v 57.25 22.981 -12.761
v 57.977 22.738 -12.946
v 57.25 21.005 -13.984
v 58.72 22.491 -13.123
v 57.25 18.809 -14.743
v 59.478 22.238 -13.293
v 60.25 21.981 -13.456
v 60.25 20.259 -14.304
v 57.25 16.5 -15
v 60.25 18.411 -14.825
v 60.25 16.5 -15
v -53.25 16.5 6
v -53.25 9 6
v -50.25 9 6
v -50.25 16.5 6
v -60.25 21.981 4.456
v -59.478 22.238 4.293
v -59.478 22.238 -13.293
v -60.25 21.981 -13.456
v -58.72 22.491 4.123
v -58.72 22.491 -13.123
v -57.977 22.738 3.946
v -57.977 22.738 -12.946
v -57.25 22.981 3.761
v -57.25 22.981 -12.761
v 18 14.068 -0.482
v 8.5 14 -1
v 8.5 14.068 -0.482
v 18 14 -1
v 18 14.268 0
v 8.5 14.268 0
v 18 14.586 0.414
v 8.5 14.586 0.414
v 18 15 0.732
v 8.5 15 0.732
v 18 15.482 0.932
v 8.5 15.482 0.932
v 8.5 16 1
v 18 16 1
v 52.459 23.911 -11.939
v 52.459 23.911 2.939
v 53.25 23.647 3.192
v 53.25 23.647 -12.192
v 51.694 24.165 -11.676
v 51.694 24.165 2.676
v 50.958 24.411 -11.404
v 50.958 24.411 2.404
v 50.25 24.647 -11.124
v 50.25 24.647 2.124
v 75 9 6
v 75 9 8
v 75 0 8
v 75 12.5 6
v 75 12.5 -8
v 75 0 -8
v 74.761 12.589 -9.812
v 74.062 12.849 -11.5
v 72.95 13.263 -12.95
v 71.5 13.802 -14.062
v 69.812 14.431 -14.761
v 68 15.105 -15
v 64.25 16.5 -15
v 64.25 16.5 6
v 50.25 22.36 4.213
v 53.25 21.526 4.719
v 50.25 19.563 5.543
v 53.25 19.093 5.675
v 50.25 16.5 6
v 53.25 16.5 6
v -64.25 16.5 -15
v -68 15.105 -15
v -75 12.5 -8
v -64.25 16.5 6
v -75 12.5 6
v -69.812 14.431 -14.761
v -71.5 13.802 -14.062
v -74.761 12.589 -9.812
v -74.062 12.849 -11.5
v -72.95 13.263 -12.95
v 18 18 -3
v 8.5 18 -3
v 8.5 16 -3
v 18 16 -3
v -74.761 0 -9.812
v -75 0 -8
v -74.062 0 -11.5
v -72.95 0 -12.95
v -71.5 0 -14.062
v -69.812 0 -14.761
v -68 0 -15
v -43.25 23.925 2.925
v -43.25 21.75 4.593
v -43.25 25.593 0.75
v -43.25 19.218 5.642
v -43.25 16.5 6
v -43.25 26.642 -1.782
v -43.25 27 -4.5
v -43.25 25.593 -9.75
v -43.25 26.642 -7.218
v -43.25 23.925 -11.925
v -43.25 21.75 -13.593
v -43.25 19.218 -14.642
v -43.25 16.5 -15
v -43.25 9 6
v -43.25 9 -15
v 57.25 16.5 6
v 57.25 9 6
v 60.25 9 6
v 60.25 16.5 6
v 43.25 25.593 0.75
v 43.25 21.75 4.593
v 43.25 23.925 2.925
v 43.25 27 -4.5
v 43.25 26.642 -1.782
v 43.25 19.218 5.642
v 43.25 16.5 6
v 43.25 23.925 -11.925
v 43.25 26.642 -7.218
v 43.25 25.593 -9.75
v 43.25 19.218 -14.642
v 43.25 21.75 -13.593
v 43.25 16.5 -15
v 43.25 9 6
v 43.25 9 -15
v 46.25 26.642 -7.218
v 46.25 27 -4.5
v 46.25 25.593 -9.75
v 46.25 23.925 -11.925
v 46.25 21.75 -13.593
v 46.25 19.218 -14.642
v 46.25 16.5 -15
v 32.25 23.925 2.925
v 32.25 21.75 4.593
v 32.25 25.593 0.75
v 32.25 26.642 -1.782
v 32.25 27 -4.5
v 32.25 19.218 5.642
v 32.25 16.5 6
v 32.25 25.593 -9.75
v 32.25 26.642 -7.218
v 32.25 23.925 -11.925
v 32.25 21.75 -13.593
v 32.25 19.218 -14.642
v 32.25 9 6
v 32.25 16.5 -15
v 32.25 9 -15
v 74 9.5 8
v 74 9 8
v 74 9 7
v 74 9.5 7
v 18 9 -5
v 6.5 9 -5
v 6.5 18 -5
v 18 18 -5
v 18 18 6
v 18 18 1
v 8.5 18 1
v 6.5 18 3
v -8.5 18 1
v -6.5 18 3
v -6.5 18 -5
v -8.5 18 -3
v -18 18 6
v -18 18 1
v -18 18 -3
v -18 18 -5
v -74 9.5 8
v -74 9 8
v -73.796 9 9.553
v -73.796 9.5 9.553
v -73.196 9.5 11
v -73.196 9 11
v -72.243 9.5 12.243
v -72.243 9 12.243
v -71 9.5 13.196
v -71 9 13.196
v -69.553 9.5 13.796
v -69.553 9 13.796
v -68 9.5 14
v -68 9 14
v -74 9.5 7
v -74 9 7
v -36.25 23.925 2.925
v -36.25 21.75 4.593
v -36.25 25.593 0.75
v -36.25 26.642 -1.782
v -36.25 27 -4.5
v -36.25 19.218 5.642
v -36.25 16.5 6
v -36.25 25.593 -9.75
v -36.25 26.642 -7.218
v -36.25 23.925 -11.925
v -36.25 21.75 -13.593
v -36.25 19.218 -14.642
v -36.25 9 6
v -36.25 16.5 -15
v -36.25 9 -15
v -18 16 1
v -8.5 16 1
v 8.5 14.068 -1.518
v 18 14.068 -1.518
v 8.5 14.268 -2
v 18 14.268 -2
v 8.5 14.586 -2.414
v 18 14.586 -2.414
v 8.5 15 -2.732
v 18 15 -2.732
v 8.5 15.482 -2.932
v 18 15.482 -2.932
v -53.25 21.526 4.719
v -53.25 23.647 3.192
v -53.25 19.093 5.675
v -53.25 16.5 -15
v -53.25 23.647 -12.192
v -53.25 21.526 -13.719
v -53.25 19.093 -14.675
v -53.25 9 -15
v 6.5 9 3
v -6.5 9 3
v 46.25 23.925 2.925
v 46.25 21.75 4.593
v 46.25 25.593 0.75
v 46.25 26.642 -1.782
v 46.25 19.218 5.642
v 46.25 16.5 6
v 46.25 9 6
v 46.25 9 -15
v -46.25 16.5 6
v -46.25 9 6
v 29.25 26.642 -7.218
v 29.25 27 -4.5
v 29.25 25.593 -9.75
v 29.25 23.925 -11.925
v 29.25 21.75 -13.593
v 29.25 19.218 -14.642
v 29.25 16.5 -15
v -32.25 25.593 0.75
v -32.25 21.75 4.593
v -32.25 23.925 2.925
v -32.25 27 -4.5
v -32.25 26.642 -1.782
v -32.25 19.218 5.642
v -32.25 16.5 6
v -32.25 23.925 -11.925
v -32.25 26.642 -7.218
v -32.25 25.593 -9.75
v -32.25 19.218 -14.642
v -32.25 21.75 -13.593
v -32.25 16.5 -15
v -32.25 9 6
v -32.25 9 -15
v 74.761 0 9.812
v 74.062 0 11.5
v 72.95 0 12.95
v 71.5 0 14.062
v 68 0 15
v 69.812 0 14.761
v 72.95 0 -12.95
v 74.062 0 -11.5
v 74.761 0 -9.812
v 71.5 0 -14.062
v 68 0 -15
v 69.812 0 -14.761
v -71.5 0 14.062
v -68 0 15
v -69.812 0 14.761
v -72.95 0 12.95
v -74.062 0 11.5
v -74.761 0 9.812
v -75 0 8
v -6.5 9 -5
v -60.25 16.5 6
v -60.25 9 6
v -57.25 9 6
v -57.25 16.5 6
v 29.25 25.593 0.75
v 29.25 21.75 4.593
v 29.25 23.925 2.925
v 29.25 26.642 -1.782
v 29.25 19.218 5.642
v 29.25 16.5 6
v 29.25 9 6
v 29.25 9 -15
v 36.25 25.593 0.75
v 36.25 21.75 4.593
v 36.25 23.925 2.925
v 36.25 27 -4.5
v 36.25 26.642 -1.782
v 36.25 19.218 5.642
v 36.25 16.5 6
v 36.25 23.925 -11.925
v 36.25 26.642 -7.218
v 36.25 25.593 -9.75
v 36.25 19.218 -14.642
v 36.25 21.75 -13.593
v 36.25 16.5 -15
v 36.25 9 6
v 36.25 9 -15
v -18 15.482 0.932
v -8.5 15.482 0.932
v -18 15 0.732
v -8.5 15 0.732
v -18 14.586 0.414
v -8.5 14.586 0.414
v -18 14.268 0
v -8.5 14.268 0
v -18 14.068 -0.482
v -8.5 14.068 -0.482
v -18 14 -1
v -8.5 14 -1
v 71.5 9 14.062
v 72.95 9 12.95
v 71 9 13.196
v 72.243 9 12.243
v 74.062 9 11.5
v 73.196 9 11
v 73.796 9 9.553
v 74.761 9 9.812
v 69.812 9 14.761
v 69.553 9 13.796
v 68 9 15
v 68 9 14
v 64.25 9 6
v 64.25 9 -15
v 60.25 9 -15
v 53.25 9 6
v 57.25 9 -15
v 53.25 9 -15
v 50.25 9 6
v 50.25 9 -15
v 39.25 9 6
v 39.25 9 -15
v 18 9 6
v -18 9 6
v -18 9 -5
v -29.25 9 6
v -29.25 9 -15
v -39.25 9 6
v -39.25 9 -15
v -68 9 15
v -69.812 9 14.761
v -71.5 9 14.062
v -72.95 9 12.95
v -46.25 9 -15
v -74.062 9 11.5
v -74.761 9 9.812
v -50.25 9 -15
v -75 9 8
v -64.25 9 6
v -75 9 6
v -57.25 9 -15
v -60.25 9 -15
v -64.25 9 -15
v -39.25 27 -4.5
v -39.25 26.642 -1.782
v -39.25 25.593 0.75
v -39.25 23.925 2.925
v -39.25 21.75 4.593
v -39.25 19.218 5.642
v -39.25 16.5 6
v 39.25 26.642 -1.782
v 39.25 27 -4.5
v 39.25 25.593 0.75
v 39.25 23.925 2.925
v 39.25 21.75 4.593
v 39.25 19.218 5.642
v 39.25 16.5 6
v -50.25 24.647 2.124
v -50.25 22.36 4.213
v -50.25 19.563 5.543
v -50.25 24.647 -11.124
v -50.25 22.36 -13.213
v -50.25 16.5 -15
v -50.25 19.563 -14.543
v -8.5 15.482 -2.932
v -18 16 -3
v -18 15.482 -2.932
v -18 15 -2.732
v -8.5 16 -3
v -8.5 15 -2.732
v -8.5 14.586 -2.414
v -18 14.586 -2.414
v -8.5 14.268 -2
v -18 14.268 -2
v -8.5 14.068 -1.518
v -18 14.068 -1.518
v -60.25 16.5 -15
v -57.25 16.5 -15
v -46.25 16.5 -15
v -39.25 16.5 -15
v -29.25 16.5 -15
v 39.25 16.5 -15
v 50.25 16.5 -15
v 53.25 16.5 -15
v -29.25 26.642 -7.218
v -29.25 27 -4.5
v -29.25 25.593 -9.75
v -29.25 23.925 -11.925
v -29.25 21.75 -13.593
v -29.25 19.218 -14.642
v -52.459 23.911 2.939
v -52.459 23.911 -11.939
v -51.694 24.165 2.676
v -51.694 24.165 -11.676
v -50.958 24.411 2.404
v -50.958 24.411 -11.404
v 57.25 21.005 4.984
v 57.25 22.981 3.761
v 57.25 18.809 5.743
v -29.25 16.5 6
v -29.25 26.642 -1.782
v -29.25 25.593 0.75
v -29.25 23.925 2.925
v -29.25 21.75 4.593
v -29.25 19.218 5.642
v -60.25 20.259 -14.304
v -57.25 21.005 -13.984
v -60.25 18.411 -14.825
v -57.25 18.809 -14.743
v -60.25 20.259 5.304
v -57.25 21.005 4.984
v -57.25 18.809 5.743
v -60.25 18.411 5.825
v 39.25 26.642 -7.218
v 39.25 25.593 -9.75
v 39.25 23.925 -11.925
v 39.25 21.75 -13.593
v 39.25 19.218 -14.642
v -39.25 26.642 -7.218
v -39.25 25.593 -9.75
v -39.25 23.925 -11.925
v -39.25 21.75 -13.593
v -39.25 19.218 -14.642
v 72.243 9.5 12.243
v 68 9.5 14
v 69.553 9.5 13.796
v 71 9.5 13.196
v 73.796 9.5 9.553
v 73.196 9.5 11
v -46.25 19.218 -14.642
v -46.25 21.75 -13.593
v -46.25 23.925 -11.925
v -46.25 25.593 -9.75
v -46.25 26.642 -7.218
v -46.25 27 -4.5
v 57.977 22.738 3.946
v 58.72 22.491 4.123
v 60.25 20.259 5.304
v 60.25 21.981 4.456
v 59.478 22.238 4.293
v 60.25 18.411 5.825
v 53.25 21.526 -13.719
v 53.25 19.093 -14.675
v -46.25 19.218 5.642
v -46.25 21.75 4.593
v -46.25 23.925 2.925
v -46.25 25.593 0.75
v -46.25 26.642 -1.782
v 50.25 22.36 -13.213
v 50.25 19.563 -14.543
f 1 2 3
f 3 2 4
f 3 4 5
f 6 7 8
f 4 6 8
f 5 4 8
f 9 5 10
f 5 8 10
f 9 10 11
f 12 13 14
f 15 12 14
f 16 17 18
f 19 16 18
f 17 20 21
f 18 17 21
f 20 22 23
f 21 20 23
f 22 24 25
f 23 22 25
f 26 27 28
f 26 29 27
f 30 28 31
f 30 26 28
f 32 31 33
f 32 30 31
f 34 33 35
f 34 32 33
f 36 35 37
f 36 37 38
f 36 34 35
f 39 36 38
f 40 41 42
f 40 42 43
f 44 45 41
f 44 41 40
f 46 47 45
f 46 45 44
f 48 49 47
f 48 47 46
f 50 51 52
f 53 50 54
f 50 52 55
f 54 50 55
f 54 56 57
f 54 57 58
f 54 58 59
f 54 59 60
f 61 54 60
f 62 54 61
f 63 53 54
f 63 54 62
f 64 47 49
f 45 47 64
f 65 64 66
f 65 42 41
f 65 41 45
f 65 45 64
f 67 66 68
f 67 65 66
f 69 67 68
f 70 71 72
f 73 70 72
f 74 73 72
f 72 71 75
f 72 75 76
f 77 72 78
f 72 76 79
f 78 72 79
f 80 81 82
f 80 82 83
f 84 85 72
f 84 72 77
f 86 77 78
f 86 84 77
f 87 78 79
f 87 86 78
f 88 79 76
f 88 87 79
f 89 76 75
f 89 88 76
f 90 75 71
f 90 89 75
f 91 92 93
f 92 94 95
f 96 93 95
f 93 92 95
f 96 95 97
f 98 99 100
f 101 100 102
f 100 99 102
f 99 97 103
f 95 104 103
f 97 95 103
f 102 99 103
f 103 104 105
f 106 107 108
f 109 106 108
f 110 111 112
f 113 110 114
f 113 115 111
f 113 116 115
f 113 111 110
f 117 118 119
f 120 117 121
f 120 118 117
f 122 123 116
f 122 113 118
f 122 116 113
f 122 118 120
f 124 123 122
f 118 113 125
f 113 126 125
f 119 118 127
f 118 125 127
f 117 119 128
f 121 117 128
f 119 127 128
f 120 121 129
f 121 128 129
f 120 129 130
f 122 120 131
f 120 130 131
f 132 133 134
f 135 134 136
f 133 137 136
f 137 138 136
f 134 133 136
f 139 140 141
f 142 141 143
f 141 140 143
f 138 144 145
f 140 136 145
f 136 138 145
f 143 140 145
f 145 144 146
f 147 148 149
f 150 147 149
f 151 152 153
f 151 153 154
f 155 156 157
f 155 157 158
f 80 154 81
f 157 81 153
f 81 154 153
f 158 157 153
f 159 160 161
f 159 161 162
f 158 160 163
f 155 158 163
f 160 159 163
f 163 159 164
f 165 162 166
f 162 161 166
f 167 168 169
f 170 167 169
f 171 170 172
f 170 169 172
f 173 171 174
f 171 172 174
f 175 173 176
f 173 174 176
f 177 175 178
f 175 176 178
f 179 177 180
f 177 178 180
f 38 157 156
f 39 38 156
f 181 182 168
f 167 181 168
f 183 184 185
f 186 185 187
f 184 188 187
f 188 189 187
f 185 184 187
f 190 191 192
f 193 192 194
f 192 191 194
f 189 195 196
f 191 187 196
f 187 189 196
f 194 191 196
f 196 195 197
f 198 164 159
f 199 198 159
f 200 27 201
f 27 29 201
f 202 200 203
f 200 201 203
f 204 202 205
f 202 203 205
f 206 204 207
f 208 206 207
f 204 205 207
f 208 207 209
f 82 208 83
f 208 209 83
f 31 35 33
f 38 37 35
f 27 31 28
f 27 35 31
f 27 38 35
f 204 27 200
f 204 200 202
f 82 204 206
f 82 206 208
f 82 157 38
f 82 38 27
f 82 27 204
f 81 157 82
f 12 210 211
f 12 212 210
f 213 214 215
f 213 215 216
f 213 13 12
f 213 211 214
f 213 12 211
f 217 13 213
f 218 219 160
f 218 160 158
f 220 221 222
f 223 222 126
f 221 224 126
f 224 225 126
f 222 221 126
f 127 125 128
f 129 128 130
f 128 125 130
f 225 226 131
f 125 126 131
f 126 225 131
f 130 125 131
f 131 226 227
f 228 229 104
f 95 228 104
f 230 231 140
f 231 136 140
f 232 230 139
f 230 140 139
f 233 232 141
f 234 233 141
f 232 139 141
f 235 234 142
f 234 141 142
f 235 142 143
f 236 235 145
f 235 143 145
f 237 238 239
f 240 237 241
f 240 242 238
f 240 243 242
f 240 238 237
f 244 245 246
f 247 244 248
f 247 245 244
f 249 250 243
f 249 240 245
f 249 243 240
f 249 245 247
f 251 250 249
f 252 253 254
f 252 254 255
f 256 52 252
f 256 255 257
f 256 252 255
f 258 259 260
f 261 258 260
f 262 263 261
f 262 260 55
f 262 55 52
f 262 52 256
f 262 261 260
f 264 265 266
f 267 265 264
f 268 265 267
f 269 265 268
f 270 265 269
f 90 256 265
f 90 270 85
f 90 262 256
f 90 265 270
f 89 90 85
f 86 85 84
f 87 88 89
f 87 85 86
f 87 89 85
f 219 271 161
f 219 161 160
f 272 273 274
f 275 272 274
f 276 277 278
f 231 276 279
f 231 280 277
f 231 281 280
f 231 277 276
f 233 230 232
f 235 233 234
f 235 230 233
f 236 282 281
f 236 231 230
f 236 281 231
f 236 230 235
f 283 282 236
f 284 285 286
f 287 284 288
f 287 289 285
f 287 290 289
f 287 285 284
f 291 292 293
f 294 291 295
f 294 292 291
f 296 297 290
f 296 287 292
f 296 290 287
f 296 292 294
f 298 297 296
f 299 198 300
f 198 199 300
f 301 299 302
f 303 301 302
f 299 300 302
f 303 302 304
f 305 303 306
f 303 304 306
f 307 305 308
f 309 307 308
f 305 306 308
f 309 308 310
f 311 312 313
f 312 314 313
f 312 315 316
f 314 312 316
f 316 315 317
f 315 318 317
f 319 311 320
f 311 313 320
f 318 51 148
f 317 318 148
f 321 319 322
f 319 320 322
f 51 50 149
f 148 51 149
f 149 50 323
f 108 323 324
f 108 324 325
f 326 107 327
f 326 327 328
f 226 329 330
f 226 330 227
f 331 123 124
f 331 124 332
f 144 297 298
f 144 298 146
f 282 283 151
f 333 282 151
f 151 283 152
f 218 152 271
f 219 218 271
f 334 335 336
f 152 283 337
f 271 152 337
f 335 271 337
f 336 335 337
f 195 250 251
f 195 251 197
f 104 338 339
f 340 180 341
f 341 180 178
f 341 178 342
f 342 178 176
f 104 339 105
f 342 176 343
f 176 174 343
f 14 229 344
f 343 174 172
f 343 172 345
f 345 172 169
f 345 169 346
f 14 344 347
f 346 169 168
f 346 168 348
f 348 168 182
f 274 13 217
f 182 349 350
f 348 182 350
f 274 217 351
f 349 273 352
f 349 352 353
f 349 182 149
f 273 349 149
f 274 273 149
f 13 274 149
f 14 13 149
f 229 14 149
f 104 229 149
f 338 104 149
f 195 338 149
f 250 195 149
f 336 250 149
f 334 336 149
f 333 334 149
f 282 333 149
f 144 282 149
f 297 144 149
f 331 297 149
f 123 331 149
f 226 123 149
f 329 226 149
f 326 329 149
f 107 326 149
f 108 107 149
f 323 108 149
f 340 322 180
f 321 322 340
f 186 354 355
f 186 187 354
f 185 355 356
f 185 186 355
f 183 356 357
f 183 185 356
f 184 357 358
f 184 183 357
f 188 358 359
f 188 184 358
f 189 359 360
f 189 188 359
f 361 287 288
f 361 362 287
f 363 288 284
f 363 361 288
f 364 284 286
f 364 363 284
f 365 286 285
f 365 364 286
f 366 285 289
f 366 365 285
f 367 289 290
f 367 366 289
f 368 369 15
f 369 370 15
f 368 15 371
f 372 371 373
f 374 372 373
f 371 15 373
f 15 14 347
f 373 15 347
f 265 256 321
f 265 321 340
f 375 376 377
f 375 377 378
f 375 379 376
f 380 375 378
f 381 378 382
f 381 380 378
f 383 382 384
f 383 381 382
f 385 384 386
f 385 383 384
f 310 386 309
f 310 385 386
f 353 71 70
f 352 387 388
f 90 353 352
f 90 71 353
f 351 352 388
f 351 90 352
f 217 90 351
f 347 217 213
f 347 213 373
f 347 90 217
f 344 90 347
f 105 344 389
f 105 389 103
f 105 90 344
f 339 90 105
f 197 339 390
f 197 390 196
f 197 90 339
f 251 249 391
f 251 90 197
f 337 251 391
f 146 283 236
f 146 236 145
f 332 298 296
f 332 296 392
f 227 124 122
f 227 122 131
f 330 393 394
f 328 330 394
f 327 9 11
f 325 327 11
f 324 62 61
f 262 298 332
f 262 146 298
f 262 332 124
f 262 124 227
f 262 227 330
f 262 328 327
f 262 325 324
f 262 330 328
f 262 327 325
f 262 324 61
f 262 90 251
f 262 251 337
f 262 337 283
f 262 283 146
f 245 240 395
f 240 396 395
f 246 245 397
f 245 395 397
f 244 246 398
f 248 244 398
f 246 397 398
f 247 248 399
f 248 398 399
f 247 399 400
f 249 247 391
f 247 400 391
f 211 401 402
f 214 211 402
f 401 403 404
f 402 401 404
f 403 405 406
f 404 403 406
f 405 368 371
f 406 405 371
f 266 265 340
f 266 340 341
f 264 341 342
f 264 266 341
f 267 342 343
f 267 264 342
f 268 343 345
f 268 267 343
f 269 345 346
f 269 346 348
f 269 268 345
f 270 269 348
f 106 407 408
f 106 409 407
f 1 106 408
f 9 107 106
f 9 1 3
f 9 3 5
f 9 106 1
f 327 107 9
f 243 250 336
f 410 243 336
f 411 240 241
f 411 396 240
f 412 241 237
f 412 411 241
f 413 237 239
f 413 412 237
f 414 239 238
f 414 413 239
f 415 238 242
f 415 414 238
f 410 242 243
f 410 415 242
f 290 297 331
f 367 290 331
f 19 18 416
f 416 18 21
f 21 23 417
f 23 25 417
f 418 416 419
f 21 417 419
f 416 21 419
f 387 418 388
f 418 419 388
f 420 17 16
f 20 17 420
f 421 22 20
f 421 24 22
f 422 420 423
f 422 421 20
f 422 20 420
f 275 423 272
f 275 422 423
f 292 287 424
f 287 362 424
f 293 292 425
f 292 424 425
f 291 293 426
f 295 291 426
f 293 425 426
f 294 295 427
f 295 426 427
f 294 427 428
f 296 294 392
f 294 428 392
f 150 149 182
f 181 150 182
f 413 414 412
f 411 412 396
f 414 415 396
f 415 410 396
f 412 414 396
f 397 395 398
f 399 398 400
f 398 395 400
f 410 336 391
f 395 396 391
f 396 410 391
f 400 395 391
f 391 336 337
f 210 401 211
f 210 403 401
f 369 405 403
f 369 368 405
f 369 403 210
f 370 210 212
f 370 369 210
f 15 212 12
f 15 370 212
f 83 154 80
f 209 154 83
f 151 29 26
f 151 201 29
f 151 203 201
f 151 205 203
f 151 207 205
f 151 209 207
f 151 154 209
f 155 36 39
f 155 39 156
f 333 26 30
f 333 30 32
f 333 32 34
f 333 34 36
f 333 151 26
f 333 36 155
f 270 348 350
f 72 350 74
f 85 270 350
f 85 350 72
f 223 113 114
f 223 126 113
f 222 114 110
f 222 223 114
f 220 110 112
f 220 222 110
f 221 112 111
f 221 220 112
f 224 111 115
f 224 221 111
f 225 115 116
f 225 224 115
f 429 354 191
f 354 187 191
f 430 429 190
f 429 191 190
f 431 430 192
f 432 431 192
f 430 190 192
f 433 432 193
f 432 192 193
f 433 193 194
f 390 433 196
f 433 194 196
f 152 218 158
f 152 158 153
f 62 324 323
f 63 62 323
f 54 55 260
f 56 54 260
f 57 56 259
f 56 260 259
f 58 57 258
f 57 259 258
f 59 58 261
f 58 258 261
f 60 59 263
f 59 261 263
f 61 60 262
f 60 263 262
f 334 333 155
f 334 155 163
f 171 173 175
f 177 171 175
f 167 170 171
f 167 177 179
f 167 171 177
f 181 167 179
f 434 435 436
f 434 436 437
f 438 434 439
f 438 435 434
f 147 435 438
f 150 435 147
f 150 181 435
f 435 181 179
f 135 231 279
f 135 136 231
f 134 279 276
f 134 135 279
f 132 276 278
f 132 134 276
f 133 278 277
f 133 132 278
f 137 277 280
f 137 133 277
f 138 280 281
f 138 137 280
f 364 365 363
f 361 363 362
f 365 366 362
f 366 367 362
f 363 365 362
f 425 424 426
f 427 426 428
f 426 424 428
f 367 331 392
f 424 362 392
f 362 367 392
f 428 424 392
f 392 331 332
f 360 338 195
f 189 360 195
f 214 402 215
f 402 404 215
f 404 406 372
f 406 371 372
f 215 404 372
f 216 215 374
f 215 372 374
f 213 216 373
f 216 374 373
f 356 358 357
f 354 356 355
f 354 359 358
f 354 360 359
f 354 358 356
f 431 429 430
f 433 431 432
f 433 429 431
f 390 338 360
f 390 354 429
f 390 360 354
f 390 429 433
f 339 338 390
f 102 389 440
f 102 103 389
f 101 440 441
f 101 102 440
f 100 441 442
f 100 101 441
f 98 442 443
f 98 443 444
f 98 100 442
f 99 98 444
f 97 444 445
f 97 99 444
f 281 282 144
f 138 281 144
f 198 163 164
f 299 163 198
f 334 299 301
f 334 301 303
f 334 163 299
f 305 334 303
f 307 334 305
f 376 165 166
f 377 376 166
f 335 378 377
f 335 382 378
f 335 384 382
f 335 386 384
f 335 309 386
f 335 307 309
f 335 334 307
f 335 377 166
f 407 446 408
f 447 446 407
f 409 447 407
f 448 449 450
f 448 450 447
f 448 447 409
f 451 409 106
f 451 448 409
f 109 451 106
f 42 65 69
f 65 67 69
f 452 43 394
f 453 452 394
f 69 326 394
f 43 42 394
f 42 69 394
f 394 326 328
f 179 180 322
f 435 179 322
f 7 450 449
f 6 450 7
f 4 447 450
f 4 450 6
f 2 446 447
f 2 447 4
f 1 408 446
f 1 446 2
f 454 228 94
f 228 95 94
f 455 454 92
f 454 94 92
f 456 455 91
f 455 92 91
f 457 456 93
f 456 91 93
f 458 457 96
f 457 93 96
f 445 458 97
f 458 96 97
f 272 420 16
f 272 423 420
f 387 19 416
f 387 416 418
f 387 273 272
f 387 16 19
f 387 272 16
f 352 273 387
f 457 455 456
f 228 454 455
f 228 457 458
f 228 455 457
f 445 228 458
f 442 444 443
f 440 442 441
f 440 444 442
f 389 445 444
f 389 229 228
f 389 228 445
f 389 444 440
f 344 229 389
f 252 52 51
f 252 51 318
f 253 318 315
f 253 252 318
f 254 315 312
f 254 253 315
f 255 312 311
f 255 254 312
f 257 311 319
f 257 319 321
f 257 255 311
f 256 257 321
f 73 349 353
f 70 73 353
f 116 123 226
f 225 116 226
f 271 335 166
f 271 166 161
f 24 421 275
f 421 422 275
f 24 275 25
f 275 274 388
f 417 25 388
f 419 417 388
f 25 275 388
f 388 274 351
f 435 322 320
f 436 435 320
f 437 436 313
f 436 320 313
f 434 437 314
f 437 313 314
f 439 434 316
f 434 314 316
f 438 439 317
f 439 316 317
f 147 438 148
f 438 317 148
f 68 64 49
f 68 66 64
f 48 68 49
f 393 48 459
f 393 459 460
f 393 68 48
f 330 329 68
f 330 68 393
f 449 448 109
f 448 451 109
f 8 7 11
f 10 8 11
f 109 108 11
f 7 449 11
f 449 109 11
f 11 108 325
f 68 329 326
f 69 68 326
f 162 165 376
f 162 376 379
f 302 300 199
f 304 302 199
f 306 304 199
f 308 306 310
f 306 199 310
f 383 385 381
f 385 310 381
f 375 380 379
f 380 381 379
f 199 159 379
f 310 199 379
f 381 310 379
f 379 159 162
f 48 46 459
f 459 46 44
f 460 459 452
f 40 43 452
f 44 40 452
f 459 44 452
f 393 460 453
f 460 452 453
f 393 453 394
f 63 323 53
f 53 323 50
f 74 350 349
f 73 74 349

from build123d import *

# Parameters (mm, degrees)
BOSS_EXTRUDE1_DEPTH    = 9
BOSS_EXTRUDE2_DEPTH    = 0.5
SKETCH3_W              = 3
SKETCH3_H              = 21
BOSS_EXTRUDE3_DEPTH    = 7.5
CHAMFER1_SIZE          = 10.75
CHAMFER1_SIZE_2        = 4
CHAMFER2_SIZE          = 4
CHAMFER2_SIZE_2        = 10.75
SKETCH4_W              = 3
SKETCH4_H              = 21
BOSS_EXTRUDE4_DEPTH    = 10.5
FILLET1_R              = 10.5
CUT_EXTRUDE1_START     = 22.980740698
CUT_EXTRUDE1_OUTLINE_W = 3
CUT_EXTRUDE1_OUTLINE_H = 19
CUT_EXTRUDE1_DEPTH     = 4.019259302
CHAMFER3_SIZE2         = 3
CHAMFER3_SIZE          = 1
CUT_EXTRUDE2_START     = 24.646741863
CUT_EXTRUDE2_OUTLINE_W = 3
CUT_EXTRUDE2_OUTLINE_H = 17
CUT_EXTRUDE2_DEPTH     = 2.353258137
CHAMFER4_SIZE2         = 3
CHAMFER4_SIZE          = 1
CUT_EXTRUDE3_START     = 22.980740698
CUT_EXTRUDE3_OUTLINE_W = 3
CUT_EXTRUDE3_OUTLINE_H = 19
CUT_EXTRUDE3_DEPTH     = 4.019259302
CUT_EXTRUDE4_START     = 24.646741863
CUT_EXTRUDE4_OUTLINE_W = 3
CUT_EXTRUDE4_OUTLINE_H = 17
CUT_EXTRUDE4_DEPTH     = 2.353258137
CHAMFER5_SIZE2         = 3
CHAMFER5_SIZE          = 1
CHAMFER6_SIZE2         = 3
CHAMFER6_SIZE          = 1
BOSS_EXTRUDE5_DEPTH    = 9
SKETCH10_W             = 9.5
SKETCH10_H             = 4
CUT_EXTRUDE5_DEPTH     = 4
FILLET2_R              = 2
FILLET3_R              = 2


# Read off the part's stored shape, not the designer's step: Cut-Extrude1, Cut-Extrude2, Cut-Extrude3, Cut-Extrude4
# Some blends are built 0.0001 mm under size
with BuildPart() as part:
    # Sketch1 → Boss-Extrude1 (new body)
    with BuildSketch(Plane(origin=(0, 0, 0), x_dir=(1, 0, 0), z_dir=(0, 1, 0))):
        with BuildLine():
            Line((0, 15), (68, 15))
            ThreePointArc((68, 15), (72.949747468, 12.949747468), (75, 8))
            Line((75, 8), (75, -8))
            ThreePointArc((75, -8), (72.949747468, -12.949747468), (68, -15))
            Line((68, -15), (-68, -15))
            ThreePointArc((-68, -15), (-72.949747468, -12.949747468), (-75, -8))
            Line((-75, -8), (-75, 8))
            ThreePointArc((-75, 8), (-72.949747468, 12.949747468), (-68, 15))
            Line((-68, 15), (0, 15))
        make_face()
    extrude(amount=BOSS_EXTRUDE1_DEPTH)

    # Sketch2 → Boss-Extrude2 (add)
    with BuildSketch(Plane(origin=(0, 9, 0), x_dir=(1, 0, 0), z_dir=(0, 1, 0))):
        with BuildLine():
            Line((74, -7), (-74, -7))
            Line((-74, -7), (-74, -8))
            ThreePointArc((-74, -8), (-72.242640687, -12.242640687), (-68, -14))
            Line((-68, -14), (68, -14))
            ThreePointArc((68, -14), (72.242640687, -12.242640687), (74, -8))
            Line((74, -8), (74, -7))
        make_face()
    extrude(amount=BOSS_EXTRUDE2_DEPTH)

    # Sketch3 → Boss-Extrude3 (add)
    with BuildSketch(Plane(origin=(0, 9, 0), x_dir=(1, 0, 0), z_dir=(0, 1, 0))):
        with BuildLine():
            Line((64.25, -6), (75, -6))
            Line((75, -6), (75, 8))
            ThreePointArc((75, 8), (72.949747468, 12.949747468), (68, 15))
            Line((68, 15), (64.25, 15))
            Line((64.25, 15), (64.25, -6))
        make_face()
        with BuildLine():
            Line((-75, -6), (-64.25, -6))
            Line((-64.25, -6), (-64.25, 15))
            Line((-64.25, 15), (-68, 15))
            ThreePointArc((-68, 15), (-72.949747468, 12.949747468), (-75, 8))
            Line((-75, 8), (-75, -6))
        make_face()
        with Locations((-58.75, 4.5)):
            Rectangle(SKETCH3_W, SKETCH3_H)
        with Locations((-51.75, 4.5)):
            Rectangle(SKETCH3_W, SKETCH3_H)
        with Locations((-44.75, 4.5)):
            Rectangle(SKETCH3_W, SKETCH3_H)
        with Locations((-37.75, 4.5)):
            Rectangle(SKETCH3_W, SKETCH3_H)
        with Locations((-30.75, 4.5)):
            Rectangle(SKETCH3_W, SKETCH3_H)
        with Locations((30.75, 4.5)):
            Rectangle(SKETCH3_W, SKETCH3_H)
        with Locations((37.75, 4.5)):
            Rectangle(SKETCH3_W, SKETCH3_H)
        with Locations((44.75, 4.5)):
            Rectangle(SKETCH3_W, SKETCH3_H)
        with Locations((51.75, 4.5)):
            Rectangle(SKETCH3_W, SKETCH3_H)
        with Locations((58.75, 4.5)):
            Rectangle(SKETCH3_W, SKETCH3_H)
    extrude(amount=BOSS_EXTRUDE3_DEPTH)

    # Chamfer1
    # the kernel refuses this chamfer: 10.75, 4 mm, written as the material it takes off along each edge
    with BuildSketch(Plane(origin=(-75, 16.5, -35.885033622), x_dir=(0.9999096242158825, 0.013444084217698377, 0), z_dir=(0, 0, 1))) as chamfer1_piece_1:
        Polygon((CHAMFER1_SIZE * 0.999909624216, -CHAMFER1_SIZE * 0.0134440842177), (-CHAMFER1_SIZE_2 * 0.0134440842177, -CHAMFER1_SIZE_2 * 0.999909624216), (0, 0), align=None)
    extrude(amount=69.770067243, mode=Mode.SUBTRACT)

    # Chamfer2
    # the kernel refuses this chamfer: 10.75, 4 mm, written as the material it takes off along each edge
    with BuildSketch(Plane(origin=(75, 16.5, 33.885033622), x_dir=(0.09665608708749646, -0.9953178390991163, 0), z_dir=(0, 0, -1))) as chamfer2_piece_1:
        Polygon((CHAMFER2_SIZE * 0.995317839099, CHAMFER2_SIZE * 0.0966560870875), (-CHAMFER2_SIZE_2 * 0.0966560870875, CHAMFER2_SIZE_2 * 0.995317839099), (0, 0), align=None)
    extrude(amount=69.770067243, mode=Mode.SUBTRACT)

    # Sketch4 → Boss-Extrude4 (add)
    with BuildSketch(Plane(origin=(0, 16.5, 0), x_dir=(1, 0, 0), z_dir=(0, 1, 0))):
        with Locations((-44.75, 4.5)):
            Rectangle(SKETCH4_W, SKETCH4_H)
        with Locations((-37.75, 4.5)):
            Rectangle(SKETCH4_W, SKETCH4_H)
        with Locations((-30.75, 4.5)):
            Rectangle(SKETCH4_W, SKETCH4_H)
        with Locations((30.75, 4.5)):
            Rectangle(SKETCH4_W, SKETCH4_H)
        with Locations((37.75, 4.5)):
            Rectangle(SKETCH4_W, SKETCH4_H)
        with Locations((44.75, 4.5)):
            Rectangle(SKETCH4_W, SKETCH4_H)
        with Locations((51.75, 4.5)):
            Rectangle(SKETCH4_W, SKETCH4_H)
        with Locations((58.75, 4.5)):
            Rectangle(SKETCH4_W, SKETCH4_H)
        with Locations((-51.75, 4.5)):
            Rectangle(SKETCH4_W, SKETCH4_H)
        with Locations((-58.75, 4.5)):
            Rectangle(SKETCH4_W, SKETCH4_H)
    extrude(amount=BOSS_EXTRUDE4_DEPTH)

    # Fillet1
    fillet1_edges = [part.edges().sort_by_distance(p)[0] for p in [
        (30.75, 27, 6),
        (37.75, 27, 6),
        (44.75, 27, 6),
        (51.75, 27, 6),
        (58.75, 27, 6),
        (58.75, 27, -15),
        (51.75, 27, -15),
        (44.75, 27, -15),
        (37.75, 27, -15),
        (30.75, 27, -15),
        (-30.75, 27, 6),
        (-37.75, 27, 6),
        (-44.75, 27, 6),
        (-51.75, 27, 6),
        (-58.75, 27, 6),
        (-30.75, 27, -15),
        (-37.75, 27, -15),
        (-44.75, 27, -15),
        (-51.75, 27, -15),
        (-58.75, 27, -15),
    ]]
    fillet(fillet1_edges, radius=FILLET1_R - 0.0001)  # a hair under: the kernel refuses the full size

    # Cut-Extrude1 outline → Cut-Extrude1 (cut)
    with BuildSketch(Plane(origin=(0, 0, 0), x_dir=(1, 0, 0), z_dir=(0, 1, 0)).offset(CUT_EXTRUDE1_START)):
        with Locations((-58.75, 4.5)):
            Rectangle(CUT_EXTRUDE1_OUTLINE_W, CUT_EXTRUDE1_OUTLINE_H)
    extrude(amount=CUT_EXTRUDE1_DEPTH, mode=Mode.SUBTRACT)

    # Chamfer3
    chamfer3_edges = [part.edges().sort_by_distance(p)[0] for p in [
        (-60.25, 22.980740698, -4.5),
    ]]
    chamfer3_side = [part.faces().sort_by_distance(p)[0] for p in [
        (-60.25, 22.960740698, -4.5),
    ]]
    chamfer(chamfer3_edges, length=CHAMFER3_SIZE - 0.0001, length2=CHAMFER3_SIZE2 - 0.0001, reference=chamfer3_side[0])  # a hair under: the kernel refuses the full size

    # Cut-Extrude2 outline → Cut-Extrude2 (cut)
    with BuildSketch(Plane(origin=(0, 0, 0), x_dir=(1, 0, 0), z_dir=(0, 1, 0)).offset(CUT_EXTRUDE2_START)):
        with Locations((-51.75, 4.5)):
            Rectangle(CUT_EXTRUDE2_OUTLINE_W, CUT_EXTRUDE2_OUTLINE_H)
    extrude(amount=CUT_EXTRUDE2_DEPTH, mode=Mode.SUBTRACT)

    # Chamfer4
    chamfer4_edges = [part.edges().sort_by_distance(p)[0] for p in [
        (-53.25, 24.646741863, -4.5),
    ]]
    chamfer4_side = [part.faces().sort_by_distance(p)[0] for p in [
        (-53.25, 24.626741863, -4.5),
    ]]
    chamfer(chamfer4_edges, length=CHAMFER4_SIZE - 0.0001, length2=CHAMFER4_SIZE2 - 0.0001, reference=chamfer4_side[0])  # a hair under: the kernel refuses the full size

    # Cut-Extrude3 outline → Cut-Extrude3 (cut)
    with BuildSketch(Plane(origin=(0, 0, 0), x_dir=(1, 0, 0), z_dir=(0, 1, 0)).offset(CUT_EXTRUDE3_START)):
        with Locations((58.75, 4.5)):
            Rectangle(CUT_EXTRUDE3_OUTLINE_W, CUT_EXTRUDE3_OUTLINE_H)
    extrude(amount=CUT_EXTRUDE3_DEPTH, mode=Mode.SUBTRACT)

    # Cut-Extrude4 outline → Cut-Extrude4 (cut)
    with BuildSketch(Plane(origin=(0, 0, 0), x_dir=(1, 0, 0), z_dir=(0, 1, 0)).offset(CUT_EXTRUDE4_START)):
        with Locations((51.75, 4.5)):
            Rectangle(CUT_EXTRUDE4_OUTLINE_W, CUT_EXTRUDE4_OUTLINE_H)
    extrude(amount=CUT_EXTRUDE4_DEPTH, mode=Mode.SUBTRACT)

    # Chamfer5
    chamfer5_edges = [part.edges().sort_by_distance(p)[0] for p in [
        (60.25, 22.980740698, -4.5),
    ]]
    chamfer5_side = [part.faces().sort_by_distance(p)[0] for p in [
        (60.25, 22.960740698, -4.5),
    ]]
    chamfer(chamfer5_edges, length=CHAMFER5_SIZE - 0.0001, length2=CHAMFER5_SIZE2 - 0.0001, reference=chamfer5_side[0])  # a hair under: the kernel refuses the full size

    # Chamfer6
    chamfer6_edges = [part.edges().sort_by_distance(p)[0] for p in [
        (53.25, 24.646741863, -4.5),
    ]]
    chamfer6_side = [part.faces().sort_by_distance(p)[0] for p in [
        (53.25, 24.626741863, -4.5),
    ]]
    chamfer(chamfer6_edges, length=CHAMFER6_SIZE - 0.0001, length2=CHAMFER6_SIZE2 - 0.0001, reference=chamfer6_side[0])  # a hair under: the kernel refuses the full size

    # Sketch9 → Boss-Extrude5 (add)
    with BuildSketch(Plane(origin=(0, 9, 0), x_dir=(1, 0, 0), z_dir=(0, 1, 0))):
        Polygon((-18, 5), (-6.5, 5), (-6.5, -3), (6.5, -3), (6.5, 5), (18, 5), (18, -6), (-18, -6), align=None)
    extrude(amount=BOSS_EXTRUDE5_DEPTH)

    # Sketch10 → Cut-Extrude5 (cut)
    with BuildSketch(Plane(origin=(0, 18, 0), x_dir=(1, 0, 0), z_dir=(0, 1, 0))):
        with Locations((13.25, 1)):
            Rectangle(SKETCH10_W, SKETCH10_H)
        with Locations((-13.25, 1)):
            Rectangle(SKETCH10_W, SKETCH10_H)
    extrude(amount=-CUT_EXTRUDE5_DEPTH, mode=Mode.SUBTRACT)

    # Fillet2
    fillet2_edges = [part.edges().sort_by_distance(p)[0] for p in [
        (13.25, 14, -3),
        (-13.25, 14, -3),
    ]]
    fillet(fillet2_edges, radius=FILLET2_R)

    # Fillet3
    fillet3_edges = [part.edges().sort_by_distance(p)[0] for p in [
        (-13.25, 14, 1),
        (13.25, 14, 1),
    ]]
    fillet(fillet3_edges, radius=FILLET3_R - 0.0001)  # a hair under: the kernel refuses the full size


solid = part.part
